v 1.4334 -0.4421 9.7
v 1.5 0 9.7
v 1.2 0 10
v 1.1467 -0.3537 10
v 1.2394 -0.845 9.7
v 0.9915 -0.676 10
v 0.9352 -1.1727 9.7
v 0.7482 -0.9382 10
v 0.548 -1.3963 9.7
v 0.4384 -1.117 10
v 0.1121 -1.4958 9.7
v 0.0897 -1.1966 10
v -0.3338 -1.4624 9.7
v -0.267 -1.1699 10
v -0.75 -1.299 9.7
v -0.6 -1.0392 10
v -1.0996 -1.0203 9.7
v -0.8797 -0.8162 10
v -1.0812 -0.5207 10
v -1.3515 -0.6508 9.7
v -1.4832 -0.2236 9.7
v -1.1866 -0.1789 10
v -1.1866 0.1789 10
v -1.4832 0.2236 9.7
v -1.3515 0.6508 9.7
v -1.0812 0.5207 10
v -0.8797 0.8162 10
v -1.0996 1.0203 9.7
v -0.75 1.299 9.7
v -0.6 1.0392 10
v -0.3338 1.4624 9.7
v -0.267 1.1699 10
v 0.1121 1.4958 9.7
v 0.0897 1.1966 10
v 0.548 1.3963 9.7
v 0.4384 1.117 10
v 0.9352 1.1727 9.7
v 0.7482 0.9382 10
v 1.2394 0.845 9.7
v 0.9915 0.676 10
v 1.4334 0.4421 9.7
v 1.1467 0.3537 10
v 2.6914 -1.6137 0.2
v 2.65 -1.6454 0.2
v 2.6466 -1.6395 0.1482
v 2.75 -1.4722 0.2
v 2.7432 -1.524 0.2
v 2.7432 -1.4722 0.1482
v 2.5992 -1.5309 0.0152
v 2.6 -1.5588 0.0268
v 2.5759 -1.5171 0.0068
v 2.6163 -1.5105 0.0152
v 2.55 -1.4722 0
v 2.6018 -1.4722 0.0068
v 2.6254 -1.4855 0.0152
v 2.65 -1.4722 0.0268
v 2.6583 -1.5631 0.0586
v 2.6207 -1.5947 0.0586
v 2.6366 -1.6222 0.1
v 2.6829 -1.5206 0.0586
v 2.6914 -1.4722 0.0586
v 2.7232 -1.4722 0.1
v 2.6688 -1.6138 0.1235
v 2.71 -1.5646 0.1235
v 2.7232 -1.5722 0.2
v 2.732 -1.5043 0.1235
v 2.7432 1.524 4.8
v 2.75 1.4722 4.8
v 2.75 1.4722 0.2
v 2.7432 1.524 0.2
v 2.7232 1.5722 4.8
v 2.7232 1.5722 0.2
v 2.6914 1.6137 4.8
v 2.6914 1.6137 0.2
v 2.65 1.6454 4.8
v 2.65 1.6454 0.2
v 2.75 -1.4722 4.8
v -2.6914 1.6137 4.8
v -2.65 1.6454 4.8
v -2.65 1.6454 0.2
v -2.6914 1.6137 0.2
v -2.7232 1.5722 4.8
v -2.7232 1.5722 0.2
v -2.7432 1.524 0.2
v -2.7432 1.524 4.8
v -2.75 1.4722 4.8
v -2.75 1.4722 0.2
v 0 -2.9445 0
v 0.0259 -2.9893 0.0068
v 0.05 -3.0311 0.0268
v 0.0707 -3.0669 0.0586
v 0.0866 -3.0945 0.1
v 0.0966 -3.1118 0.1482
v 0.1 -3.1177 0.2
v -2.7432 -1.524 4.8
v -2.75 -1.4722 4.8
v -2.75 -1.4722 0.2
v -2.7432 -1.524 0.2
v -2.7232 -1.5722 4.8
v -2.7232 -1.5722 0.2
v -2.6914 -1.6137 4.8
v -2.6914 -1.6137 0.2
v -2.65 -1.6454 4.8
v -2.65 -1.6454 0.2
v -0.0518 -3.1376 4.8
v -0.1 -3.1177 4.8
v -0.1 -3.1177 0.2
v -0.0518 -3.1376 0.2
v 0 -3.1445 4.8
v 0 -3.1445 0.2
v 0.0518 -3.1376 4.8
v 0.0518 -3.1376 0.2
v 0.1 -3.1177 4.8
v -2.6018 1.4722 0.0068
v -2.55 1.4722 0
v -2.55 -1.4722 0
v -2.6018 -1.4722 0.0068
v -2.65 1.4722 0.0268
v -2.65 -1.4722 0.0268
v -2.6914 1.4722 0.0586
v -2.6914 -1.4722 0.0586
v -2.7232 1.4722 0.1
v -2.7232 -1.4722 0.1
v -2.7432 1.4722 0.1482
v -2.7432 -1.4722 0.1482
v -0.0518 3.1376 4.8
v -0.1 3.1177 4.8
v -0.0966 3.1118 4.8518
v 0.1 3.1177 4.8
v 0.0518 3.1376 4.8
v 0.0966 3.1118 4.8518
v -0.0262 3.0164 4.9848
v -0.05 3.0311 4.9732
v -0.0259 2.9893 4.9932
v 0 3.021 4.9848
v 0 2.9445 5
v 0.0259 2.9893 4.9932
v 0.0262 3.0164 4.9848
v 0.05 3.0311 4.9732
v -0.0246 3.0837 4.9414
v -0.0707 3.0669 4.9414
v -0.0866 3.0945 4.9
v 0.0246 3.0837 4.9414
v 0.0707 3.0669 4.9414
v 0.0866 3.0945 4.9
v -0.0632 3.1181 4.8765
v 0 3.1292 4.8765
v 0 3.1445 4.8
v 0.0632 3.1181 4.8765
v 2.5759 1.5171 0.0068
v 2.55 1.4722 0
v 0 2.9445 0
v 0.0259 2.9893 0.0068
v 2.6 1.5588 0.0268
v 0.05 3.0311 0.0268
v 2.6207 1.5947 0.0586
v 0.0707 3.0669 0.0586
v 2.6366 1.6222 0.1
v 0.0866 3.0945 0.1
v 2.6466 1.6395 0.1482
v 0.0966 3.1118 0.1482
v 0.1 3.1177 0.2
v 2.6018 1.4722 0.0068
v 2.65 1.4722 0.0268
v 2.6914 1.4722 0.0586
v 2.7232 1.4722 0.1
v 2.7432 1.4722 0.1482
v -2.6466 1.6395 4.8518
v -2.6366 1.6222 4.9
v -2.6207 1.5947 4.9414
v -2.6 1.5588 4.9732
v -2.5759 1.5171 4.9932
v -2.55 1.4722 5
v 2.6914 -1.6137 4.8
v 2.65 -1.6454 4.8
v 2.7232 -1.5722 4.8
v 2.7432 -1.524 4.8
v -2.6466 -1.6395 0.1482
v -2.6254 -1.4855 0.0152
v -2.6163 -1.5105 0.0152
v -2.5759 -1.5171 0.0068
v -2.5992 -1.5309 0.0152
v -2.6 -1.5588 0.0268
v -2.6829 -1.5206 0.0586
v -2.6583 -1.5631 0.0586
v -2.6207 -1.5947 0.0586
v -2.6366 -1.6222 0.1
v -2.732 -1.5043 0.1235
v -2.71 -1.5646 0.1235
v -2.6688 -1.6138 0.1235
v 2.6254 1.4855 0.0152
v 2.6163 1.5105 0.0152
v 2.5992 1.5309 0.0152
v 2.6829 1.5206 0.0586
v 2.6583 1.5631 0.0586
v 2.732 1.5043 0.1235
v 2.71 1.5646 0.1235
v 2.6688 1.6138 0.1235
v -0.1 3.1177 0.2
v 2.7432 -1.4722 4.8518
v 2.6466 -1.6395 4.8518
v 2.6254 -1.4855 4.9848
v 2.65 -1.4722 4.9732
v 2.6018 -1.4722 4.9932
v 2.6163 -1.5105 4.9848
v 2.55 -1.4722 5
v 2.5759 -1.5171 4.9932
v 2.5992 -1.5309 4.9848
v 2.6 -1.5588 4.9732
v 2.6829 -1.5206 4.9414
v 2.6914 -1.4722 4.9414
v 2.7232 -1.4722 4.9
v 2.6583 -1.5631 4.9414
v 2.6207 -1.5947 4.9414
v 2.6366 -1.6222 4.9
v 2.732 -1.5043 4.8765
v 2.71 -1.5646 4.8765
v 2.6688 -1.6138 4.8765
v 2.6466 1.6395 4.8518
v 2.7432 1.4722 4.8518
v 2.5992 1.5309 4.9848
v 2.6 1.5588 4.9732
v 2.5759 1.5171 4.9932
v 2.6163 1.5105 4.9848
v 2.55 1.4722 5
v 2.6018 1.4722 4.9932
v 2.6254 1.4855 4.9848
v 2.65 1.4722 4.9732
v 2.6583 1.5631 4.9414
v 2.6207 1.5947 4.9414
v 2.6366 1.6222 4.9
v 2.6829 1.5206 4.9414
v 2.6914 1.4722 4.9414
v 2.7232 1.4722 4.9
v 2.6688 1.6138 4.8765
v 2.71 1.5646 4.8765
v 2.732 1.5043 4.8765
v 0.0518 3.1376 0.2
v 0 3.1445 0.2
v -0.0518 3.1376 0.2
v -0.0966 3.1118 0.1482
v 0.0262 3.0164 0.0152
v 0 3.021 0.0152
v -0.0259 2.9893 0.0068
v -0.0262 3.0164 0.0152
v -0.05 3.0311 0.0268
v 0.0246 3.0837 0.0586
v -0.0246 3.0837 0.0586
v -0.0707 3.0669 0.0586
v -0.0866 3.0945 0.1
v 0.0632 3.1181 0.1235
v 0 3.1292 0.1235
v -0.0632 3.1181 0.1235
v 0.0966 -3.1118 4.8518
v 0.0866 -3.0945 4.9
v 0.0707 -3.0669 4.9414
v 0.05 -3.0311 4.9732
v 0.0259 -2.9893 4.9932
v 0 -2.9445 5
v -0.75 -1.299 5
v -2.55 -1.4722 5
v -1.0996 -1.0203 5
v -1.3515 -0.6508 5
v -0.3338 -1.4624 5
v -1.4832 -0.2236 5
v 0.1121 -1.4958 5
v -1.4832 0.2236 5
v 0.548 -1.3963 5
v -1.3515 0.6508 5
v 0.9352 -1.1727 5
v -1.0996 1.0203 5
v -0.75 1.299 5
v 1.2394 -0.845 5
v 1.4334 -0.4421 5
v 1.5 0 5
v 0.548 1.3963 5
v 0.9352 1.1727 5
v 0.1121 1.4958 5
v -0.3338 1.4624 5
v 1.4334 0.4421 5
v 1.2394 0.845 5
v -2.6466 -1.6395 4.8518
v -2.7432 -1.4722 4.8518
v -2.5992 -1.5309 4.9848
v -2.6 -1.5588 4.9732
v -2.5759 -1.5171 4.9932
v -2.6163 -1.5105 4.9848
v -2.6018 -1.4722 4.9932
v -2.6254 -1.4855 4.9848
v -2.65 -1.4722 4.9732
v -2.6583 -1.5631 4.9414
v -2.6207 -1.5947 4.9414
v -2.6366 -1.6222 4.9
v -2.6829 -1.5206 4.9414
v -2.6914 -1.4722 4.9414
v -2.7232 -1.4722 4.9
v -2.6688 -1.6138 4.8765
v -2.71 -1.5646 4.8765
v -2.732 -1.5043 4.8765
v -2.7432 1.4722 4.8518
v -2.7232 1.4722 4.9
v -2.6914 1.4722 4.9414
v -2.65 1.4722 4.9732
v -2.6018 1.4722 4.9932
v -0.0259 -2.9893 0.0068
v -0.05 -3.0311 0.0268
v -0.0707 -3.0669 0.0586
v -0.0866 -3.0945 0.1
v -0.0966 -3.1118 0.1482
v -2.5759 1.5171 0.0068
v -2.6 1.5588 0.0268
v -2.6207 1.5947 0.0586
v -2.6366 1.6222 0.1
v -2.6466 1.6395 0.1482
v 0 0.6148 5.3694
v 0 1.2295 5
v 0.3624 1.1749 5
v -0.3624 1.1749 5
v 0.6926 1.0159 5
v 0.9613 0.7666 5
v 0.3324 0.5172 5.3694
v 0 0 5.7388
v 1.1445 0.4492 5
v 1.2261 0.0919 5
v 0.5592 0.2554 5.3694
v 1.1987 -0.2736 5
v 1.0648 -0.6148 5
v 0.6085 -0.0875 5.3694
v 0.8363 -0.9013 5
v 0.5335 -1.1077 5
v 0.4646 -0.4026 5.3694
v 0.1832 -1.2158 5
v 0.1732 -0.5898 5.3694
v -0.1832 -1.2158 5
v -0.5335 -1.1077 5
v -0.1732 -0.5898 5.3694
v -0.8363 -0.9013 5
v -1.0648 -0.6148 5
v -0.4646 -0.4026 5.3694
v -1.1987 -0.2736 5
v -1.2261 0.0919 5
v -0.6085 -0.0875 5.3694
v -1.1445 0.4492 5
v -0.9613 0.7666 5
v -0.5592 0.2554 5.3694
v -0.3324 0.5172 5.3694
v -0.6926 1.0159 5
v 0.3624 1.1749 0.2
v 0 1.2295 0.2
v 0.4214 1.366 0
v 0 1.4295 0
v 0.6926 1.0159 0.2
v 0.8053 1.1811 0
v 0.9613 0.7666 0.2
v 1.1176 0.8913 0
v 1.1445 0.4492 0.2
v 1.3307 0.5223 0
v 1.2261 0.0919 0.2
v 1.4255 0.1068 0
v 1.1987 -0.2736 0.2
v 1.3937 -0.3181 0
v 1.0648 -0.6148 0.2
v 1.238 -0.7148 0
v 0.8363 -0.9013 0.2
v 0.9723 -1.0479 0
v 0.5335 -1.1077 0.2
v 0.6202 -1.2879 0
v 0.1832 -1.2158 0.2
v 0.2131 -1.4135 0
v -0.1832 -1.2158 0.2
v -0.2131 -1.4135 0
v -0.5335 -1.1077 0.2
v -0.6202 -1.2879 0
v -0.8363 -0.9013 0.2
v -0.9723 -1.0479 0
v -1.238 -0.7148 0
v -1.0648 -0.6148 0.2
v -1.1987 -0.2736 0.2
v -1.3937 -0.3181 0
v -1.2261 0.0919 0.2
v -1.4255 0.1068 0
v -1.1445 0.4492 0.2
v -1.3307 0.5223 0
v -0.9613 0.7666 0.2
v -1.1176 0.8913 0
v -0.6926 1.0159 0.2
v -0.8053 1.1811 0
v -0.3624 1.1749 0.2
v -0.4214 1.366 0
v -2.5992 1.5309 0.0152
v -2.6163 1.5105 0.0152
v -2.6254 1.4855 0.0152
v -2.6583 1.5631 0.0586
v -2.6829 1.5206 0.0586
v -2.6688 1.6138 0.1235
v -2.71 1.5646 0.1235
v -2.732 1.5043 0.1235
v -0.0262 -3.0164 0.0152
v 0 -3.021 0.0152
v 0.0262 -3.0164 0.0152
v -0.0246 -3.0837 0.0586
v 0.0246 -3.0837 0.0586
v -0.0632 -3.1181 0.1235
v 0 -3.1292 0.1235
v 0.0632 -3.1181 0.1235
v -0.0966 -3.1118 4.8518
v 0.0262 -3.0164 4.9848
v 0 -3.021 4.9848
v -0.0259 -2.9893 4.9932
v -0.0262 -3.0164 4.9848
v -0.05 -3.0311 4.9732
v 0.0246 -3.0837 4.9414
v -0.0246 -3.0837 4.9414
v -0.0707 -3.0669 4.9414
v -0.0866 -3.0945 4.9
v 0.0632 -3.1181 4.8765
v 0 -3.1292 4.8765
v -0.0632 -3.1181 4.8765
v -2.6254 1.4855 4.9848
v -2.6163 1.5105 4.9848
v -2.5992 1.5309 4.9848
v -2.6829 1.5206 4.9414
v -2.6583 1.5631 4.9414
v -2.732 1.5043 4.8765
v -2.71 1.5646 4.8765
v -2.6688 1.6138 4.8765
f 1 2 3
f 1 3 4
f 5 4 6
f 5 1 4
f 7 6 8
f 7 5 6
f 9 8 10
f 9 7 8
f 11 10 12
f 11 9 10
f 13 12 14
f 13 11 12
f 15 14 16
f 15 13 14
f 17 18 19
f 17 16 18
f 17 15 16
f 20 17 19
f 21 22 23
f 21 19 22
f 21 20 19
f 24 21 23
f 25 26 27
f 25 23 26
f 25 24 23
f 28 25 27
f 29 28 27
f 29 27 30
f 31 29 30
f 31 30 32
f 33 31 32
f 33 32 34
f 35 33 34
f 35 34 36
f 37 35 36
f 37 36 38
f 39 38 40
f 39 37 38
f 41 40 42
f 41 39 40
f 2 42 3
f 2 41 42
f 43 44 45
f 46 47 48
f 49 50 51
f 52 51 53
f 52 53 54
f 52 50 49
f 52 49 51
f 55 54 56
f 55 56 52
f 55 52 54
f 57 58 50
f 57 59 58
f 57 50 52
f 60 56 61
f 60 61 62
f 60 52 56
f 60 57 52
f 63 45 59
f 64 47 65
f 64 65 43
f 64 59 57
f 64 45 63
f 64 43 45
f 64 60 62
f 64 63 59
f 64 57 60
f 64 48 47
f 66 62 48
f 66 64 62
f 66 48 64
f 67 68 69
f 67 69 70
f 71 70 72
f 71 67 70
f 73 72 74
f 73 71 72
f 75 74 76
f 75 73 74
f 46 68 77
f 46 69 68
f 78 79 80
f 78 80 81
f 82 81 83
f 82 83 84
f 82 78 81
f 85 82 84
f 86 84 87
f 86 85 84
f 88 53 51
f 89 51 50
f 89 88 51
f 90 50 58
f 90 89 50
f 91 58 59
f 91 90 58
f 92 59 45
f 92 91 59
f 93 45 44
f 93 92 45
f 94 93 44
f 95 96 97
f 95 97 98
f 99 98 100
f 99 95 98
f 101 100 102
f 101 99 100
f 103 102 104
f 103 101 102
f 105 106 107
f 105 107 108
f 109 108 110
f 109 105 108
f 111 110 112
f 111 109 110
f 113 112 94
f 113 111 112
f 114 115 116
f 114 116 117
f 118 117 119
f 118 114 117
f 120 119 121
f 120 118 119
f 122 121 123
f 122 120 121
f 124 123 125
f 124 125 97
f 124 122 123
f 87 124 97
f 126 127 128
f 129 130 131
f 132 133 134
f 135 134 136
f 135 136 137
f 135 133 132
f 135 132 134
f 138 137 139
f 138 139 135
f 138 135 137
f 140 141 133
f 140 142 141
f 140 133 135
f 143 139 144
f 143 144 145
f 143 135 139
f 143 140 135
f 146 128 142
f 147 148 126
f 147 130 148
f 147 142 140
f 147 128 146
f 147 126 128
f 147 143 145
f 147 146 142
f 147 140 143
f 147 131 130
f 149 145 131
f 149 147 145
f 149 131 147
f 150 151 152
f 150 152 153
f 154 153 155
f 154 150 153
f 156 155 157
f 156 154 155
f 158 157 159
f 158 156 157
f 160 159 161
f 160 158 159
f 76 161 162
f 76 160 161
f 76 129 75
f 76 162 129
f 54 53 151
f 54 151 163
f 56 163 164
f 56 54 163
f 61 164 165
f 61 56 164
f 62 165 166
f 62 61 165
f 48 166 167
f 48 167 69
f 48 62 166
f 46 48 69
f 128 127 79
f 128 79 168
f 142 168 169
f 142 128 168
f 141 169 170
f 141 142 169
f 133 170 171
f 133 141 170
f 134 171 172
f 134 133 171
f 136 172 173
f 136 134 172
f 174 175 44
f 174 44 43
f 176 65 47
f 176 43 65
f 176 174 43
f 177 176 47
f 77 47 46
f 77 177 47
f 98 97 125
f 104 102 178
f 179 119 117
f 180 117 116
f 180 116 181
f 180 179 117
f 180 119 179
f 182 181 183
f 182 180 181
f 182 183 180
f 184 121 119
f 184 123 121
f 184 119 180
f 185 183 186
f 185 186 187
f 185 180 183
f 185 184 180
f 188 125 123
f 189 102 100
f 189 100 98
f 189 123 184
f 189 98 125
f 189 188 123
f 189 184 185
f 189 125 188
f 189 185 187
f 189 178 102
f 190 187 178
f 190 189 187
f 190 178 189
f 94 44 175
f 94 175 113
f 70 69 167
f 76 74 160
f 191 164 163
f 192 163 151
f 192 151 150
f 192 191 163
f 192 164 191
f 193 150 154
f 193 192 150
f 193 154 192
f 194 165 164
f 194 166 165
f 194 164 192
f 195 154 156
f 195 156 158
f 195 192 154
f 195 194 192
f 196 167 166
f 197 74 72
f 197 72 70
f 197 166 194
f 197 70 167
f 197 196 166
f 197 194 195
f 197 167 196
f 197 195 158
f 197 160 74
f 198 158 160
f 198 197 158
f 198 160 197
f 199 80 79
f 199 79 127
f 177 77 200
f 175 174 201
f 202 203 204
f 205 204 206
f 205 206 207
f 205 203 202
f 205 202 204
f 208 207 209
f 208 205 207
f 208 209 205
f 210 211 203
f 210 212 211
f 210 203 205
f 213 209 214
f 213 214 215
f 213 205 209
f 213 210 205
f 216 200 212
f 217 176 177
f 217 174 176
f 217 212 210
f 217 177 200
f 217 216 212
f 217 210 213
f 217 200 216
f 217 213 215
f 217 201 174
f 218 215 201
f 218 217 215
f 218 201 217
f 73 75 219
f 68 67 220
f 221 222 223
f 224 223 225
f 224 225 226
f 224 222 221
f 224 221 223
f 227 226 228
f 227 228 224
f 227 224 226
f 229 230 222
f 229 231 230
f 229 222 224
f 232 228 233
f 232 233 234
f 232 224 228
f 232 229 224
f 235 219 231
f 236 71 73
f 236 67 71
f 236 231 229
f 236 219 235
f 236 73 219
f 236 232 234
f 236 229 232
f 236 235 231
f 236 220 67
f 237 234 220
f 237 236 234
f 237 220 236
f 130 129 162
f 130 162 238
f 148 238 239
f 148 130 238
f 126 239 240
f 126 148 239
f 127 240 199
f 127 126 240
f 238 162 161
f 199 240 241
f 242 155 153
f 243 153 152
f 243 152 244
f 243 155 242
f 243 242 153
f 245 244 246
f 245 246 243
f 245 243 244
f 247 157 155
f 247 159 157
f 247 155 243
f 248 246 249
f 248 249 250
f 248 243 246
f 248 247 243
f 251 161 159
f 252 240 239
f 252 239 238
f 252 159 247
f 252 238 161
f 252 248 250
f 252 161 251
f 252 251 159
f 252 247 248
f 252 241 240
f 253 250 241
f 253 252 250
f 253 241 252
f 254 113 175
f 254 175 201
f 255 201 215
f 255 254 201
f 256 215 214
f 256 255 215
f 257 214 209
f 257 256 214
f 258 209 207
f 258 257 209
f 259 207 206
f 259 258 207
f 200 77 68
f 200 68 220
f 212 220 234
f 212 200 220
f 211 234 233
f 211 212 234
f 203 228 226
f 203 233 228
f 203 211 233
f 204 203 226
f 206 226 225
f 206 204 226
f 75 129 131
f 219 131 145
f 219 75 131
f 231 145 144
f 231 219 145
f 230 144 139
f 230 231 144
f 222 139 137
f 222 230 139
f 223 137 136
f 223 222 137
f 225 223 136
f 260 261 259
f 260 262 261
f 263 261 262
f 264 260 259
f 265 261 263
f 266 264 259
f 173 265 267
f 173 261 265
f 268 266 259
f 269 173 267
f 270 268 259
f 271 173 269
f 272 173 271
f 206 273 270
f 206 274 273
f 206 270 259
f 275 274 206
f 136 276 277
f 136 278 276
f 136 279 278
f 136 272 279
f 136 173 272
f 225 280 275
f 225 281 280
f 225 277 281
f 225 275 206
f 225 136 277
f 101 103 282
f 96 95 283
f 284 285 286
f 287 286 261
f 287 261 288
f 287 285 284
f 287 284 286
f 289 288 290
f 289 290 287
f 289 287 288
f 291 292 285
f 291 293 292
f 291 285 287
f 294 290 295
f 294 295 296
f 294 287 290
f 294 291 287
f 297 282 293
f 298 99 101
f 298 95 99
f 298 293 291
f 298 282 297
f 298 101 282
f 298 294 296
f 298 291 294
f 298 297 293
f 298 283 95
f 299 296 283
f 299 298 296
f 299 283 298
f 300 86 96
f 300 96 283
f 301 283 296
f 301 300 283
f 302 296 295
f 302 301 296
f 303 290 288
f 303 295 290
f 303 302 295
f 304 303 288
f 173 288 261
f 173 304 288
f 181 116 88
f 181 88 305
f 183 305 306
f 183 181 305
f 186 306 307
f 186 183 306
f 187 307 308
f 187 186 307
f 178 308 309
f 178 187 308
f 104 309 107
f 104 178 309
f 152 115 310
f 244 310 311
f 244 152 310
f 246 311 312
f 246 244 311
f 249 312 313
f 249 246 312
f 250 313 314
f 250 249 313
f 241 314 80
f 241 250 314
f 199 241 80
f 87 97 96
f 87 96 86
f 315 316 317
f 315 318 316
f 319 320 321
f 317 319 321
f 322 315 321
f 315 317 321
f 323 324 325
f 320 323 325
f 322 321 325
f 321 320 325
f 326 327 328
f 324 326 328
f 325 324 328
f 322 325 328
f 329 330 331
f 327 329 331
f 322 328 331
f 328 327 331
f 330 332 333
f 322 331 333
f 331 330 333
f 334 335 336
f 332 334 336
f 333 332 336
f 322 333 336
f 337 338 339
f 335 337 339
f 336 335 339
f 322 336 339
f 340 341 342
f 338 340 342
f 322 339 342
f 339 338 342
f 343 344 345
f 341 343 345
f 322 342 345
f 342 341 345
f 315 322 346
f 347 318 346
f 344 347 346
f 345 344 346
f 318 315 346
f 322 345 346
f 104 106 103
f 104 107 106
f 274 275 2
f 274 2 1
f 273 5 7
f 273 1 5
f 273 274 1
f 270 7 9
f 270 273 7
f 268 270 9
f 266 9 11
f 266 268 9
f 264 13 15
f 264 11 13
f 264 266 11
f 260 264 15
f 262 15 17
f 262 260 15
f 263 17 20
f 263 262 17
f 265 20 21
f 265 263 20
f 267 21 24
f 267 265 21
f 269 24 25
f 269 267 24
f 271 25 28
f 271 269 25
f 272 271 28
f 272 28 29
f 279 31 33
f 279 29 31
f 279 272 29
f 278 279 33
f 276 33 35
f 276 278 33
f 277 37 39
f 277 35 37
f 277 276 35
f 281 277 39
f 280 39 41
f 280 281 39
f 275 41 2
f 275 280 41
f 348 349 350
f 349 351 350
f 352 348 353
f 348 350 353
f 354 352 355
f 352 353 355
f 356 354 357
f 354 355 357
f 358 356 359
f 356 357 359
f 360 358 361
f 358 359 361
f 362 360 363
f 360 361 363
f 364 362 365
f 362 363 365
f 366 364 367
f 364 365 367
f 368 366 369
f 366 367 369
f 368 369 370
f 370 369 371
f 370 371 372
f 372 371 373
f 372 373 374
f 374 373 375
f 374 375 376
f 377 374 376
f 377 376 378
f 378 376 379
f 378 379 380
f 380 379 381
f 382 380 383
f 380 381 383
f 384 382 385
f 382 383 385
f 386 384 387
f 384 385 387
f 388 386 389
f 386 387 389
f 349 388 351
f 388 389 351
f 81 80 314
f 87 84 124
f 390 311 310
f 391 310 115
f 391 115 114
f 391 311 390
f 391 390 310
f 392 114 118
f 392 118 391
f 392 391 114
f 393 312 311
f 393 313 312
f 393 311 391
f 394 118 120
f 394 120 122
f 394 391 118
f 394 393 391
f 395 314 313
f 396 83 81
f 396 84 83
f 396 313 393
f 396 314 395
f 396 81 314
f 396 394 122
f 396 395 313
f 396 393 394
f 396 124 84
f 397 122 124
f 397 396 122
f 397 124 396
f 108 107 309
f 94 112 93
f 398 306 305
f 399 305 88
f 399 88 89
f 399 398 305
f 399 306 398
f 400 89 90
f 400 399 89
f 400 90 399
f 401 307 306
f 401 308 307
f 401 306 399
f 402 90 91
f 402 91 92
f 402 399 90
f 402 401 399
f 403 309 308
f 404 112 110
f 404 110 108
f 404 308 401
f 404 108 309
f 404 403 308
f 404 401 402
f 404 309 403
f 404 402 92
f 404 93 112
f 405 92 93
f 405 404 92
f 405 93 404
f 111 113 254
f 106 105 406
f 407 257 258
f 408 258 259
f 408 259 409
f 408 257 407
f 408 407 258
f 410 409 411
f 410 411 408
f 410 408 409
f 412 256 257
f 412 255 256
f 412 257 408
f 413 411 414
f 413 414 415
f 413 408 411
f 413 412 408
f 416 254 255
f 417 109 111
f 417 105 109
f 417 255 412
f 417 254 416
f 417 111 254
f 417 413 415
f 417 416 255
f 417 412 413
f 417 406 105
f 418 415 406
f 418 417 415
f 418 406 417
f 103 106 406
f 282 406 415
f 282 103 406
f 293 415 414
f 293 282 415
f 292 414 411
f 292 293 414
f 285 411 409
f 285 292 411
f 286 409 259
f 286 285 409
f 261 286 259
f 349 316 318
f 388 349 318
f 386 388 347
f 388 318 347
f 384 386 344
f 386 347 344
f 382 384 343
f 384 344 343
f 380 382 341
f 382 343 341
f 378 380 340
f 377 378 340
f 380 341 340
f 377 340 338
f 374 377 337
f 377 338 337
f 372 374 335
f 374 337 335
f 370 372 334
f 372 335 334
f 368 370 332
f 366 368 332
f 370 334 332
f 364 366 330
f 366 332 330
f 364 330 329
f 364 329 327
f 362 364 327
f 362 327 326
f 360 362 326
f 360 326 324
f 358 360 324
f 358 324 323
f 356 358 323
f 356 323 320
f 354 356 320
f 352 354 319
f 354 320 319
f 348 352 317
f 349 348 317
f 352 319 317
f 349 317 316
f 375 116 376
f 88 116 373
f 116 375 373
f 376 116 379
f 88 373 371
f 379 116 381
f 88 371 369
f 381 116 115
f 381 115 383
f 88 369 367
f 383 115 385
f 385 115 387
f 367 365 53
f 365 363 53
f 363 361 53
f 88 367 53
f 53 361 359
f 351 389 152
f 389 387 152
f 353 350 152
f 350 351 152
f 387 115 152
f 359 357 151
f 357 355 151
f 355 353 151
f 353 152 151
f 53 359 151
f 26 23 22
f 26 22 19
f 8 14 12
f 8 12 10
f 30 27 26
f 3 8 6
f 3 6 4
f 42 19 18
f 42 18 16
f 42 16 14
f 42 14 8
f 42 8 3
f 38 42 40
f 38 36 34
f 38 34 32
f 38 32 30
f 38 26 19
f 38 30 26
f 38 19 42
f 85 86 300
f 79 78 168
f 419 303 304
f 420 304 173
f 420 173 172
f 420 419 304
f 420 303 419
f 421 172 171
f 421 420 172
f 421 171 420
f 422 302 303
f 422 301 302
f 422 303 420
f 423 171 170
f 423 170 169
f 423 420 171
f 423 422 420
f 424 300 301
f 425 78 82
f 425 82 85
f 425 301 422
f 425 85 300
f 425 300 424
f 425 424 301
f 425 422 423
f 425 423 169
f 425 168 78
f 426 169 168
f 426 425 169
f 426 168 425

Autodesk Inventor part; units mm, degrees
ref_plane "YZ Plane" through (0, 0, 0) normal (1, 0, 0) x (0, 1, 0)
ref_plane "XZ Plane" through (0, 0, 0) normal (0, 1, 0) x (-1, 0, 0)
ref_plane "XY Plane" through (0, 0, 0) normal (0, 0, 1) x (1, 0, 0)
sketch "スケッチ1" plane through (0, 0, 0) normal (0, 0, 1) x (1, 0, 0)
  line L0 (0, 3.1754) -> (2.75, 1.5877)
  line L1 (2.75, 1.5877) -> (2.75, -1.5877)
  line L2 (2.75, -1.5877) -> (0, -3.1754)
  line L3 (0, -3.1754) -> (-2.75, -1.5877)
  line L4 (-2.75, -1.5877) -> (-2.75, 1.5877)
  line L5 (-2.75, 1.5877) -> (0, 3.1754)
  point P0 (0, 0)
  point P1 (0, 0)
  dimension "d0" = 5.5
extrude "押し出し1" add sketch "スケッチ1" along normal blind 5
sketch "スケッチ2" plane through (0, 0, 5) normal (0, 0, 1) x (1, 0, 0)
  circle A0 centre (0, 0) radius 1.5
  dimension "d3" = 3
extrude "押し出し2" add sketch "スケッチ2" along normal blind 5
thread "ねじ1" size "M3x0.5" class "6g" standard "ANSI Metric M Profile" length 12
chamfer "面取り1" distance 0.3 angle 45 1 edges at (-1.5, 0, 10)
fillet "フィレット1" radius 0.2 18 edges at (-1.375, 2.3816, 5) (1.375, 2.3816, 5) (2.75, 0, 5) (1.375, -2.3816, 5) (-1.375, -2.3816, 5) (-2.75, 0, 5) (-2.75, -1.5877, 2.5) (0, -3.1754, 2.5) (2.75, -1.5877, 2.5) (2.75, 1.5877, 2.5) (0, 3.1754, 2.5) (-2.75, 1.5877, 2.5) (-1.375, 2.3816, 0) (1.375, 2.3816, 0) (2.75, 0, 0) (1.375, -2.3816, 0) (-1.375, -2.3816, 0) (-2.75, 0, 0)
sketch "スケッチ3" plane through (0, 0, 0) normal (0, 0, -1) x (-1, 0, 0)
  point P0 (0, 0)
hole "穴1" at (0, 0, 0) direction (0, 0, 1) diameter 2.459 depth 5 tip angle 118 thread size "M3x0.5" class "6H" standard "ANSI Metric M Profile"
chamfer "面取り2" distance 0.2 angle 45 1 edges at (0, -1.2295, 0)
properties part number "hexagonal_spacer_M3_5mm" material "鋼、炭素鋼"
